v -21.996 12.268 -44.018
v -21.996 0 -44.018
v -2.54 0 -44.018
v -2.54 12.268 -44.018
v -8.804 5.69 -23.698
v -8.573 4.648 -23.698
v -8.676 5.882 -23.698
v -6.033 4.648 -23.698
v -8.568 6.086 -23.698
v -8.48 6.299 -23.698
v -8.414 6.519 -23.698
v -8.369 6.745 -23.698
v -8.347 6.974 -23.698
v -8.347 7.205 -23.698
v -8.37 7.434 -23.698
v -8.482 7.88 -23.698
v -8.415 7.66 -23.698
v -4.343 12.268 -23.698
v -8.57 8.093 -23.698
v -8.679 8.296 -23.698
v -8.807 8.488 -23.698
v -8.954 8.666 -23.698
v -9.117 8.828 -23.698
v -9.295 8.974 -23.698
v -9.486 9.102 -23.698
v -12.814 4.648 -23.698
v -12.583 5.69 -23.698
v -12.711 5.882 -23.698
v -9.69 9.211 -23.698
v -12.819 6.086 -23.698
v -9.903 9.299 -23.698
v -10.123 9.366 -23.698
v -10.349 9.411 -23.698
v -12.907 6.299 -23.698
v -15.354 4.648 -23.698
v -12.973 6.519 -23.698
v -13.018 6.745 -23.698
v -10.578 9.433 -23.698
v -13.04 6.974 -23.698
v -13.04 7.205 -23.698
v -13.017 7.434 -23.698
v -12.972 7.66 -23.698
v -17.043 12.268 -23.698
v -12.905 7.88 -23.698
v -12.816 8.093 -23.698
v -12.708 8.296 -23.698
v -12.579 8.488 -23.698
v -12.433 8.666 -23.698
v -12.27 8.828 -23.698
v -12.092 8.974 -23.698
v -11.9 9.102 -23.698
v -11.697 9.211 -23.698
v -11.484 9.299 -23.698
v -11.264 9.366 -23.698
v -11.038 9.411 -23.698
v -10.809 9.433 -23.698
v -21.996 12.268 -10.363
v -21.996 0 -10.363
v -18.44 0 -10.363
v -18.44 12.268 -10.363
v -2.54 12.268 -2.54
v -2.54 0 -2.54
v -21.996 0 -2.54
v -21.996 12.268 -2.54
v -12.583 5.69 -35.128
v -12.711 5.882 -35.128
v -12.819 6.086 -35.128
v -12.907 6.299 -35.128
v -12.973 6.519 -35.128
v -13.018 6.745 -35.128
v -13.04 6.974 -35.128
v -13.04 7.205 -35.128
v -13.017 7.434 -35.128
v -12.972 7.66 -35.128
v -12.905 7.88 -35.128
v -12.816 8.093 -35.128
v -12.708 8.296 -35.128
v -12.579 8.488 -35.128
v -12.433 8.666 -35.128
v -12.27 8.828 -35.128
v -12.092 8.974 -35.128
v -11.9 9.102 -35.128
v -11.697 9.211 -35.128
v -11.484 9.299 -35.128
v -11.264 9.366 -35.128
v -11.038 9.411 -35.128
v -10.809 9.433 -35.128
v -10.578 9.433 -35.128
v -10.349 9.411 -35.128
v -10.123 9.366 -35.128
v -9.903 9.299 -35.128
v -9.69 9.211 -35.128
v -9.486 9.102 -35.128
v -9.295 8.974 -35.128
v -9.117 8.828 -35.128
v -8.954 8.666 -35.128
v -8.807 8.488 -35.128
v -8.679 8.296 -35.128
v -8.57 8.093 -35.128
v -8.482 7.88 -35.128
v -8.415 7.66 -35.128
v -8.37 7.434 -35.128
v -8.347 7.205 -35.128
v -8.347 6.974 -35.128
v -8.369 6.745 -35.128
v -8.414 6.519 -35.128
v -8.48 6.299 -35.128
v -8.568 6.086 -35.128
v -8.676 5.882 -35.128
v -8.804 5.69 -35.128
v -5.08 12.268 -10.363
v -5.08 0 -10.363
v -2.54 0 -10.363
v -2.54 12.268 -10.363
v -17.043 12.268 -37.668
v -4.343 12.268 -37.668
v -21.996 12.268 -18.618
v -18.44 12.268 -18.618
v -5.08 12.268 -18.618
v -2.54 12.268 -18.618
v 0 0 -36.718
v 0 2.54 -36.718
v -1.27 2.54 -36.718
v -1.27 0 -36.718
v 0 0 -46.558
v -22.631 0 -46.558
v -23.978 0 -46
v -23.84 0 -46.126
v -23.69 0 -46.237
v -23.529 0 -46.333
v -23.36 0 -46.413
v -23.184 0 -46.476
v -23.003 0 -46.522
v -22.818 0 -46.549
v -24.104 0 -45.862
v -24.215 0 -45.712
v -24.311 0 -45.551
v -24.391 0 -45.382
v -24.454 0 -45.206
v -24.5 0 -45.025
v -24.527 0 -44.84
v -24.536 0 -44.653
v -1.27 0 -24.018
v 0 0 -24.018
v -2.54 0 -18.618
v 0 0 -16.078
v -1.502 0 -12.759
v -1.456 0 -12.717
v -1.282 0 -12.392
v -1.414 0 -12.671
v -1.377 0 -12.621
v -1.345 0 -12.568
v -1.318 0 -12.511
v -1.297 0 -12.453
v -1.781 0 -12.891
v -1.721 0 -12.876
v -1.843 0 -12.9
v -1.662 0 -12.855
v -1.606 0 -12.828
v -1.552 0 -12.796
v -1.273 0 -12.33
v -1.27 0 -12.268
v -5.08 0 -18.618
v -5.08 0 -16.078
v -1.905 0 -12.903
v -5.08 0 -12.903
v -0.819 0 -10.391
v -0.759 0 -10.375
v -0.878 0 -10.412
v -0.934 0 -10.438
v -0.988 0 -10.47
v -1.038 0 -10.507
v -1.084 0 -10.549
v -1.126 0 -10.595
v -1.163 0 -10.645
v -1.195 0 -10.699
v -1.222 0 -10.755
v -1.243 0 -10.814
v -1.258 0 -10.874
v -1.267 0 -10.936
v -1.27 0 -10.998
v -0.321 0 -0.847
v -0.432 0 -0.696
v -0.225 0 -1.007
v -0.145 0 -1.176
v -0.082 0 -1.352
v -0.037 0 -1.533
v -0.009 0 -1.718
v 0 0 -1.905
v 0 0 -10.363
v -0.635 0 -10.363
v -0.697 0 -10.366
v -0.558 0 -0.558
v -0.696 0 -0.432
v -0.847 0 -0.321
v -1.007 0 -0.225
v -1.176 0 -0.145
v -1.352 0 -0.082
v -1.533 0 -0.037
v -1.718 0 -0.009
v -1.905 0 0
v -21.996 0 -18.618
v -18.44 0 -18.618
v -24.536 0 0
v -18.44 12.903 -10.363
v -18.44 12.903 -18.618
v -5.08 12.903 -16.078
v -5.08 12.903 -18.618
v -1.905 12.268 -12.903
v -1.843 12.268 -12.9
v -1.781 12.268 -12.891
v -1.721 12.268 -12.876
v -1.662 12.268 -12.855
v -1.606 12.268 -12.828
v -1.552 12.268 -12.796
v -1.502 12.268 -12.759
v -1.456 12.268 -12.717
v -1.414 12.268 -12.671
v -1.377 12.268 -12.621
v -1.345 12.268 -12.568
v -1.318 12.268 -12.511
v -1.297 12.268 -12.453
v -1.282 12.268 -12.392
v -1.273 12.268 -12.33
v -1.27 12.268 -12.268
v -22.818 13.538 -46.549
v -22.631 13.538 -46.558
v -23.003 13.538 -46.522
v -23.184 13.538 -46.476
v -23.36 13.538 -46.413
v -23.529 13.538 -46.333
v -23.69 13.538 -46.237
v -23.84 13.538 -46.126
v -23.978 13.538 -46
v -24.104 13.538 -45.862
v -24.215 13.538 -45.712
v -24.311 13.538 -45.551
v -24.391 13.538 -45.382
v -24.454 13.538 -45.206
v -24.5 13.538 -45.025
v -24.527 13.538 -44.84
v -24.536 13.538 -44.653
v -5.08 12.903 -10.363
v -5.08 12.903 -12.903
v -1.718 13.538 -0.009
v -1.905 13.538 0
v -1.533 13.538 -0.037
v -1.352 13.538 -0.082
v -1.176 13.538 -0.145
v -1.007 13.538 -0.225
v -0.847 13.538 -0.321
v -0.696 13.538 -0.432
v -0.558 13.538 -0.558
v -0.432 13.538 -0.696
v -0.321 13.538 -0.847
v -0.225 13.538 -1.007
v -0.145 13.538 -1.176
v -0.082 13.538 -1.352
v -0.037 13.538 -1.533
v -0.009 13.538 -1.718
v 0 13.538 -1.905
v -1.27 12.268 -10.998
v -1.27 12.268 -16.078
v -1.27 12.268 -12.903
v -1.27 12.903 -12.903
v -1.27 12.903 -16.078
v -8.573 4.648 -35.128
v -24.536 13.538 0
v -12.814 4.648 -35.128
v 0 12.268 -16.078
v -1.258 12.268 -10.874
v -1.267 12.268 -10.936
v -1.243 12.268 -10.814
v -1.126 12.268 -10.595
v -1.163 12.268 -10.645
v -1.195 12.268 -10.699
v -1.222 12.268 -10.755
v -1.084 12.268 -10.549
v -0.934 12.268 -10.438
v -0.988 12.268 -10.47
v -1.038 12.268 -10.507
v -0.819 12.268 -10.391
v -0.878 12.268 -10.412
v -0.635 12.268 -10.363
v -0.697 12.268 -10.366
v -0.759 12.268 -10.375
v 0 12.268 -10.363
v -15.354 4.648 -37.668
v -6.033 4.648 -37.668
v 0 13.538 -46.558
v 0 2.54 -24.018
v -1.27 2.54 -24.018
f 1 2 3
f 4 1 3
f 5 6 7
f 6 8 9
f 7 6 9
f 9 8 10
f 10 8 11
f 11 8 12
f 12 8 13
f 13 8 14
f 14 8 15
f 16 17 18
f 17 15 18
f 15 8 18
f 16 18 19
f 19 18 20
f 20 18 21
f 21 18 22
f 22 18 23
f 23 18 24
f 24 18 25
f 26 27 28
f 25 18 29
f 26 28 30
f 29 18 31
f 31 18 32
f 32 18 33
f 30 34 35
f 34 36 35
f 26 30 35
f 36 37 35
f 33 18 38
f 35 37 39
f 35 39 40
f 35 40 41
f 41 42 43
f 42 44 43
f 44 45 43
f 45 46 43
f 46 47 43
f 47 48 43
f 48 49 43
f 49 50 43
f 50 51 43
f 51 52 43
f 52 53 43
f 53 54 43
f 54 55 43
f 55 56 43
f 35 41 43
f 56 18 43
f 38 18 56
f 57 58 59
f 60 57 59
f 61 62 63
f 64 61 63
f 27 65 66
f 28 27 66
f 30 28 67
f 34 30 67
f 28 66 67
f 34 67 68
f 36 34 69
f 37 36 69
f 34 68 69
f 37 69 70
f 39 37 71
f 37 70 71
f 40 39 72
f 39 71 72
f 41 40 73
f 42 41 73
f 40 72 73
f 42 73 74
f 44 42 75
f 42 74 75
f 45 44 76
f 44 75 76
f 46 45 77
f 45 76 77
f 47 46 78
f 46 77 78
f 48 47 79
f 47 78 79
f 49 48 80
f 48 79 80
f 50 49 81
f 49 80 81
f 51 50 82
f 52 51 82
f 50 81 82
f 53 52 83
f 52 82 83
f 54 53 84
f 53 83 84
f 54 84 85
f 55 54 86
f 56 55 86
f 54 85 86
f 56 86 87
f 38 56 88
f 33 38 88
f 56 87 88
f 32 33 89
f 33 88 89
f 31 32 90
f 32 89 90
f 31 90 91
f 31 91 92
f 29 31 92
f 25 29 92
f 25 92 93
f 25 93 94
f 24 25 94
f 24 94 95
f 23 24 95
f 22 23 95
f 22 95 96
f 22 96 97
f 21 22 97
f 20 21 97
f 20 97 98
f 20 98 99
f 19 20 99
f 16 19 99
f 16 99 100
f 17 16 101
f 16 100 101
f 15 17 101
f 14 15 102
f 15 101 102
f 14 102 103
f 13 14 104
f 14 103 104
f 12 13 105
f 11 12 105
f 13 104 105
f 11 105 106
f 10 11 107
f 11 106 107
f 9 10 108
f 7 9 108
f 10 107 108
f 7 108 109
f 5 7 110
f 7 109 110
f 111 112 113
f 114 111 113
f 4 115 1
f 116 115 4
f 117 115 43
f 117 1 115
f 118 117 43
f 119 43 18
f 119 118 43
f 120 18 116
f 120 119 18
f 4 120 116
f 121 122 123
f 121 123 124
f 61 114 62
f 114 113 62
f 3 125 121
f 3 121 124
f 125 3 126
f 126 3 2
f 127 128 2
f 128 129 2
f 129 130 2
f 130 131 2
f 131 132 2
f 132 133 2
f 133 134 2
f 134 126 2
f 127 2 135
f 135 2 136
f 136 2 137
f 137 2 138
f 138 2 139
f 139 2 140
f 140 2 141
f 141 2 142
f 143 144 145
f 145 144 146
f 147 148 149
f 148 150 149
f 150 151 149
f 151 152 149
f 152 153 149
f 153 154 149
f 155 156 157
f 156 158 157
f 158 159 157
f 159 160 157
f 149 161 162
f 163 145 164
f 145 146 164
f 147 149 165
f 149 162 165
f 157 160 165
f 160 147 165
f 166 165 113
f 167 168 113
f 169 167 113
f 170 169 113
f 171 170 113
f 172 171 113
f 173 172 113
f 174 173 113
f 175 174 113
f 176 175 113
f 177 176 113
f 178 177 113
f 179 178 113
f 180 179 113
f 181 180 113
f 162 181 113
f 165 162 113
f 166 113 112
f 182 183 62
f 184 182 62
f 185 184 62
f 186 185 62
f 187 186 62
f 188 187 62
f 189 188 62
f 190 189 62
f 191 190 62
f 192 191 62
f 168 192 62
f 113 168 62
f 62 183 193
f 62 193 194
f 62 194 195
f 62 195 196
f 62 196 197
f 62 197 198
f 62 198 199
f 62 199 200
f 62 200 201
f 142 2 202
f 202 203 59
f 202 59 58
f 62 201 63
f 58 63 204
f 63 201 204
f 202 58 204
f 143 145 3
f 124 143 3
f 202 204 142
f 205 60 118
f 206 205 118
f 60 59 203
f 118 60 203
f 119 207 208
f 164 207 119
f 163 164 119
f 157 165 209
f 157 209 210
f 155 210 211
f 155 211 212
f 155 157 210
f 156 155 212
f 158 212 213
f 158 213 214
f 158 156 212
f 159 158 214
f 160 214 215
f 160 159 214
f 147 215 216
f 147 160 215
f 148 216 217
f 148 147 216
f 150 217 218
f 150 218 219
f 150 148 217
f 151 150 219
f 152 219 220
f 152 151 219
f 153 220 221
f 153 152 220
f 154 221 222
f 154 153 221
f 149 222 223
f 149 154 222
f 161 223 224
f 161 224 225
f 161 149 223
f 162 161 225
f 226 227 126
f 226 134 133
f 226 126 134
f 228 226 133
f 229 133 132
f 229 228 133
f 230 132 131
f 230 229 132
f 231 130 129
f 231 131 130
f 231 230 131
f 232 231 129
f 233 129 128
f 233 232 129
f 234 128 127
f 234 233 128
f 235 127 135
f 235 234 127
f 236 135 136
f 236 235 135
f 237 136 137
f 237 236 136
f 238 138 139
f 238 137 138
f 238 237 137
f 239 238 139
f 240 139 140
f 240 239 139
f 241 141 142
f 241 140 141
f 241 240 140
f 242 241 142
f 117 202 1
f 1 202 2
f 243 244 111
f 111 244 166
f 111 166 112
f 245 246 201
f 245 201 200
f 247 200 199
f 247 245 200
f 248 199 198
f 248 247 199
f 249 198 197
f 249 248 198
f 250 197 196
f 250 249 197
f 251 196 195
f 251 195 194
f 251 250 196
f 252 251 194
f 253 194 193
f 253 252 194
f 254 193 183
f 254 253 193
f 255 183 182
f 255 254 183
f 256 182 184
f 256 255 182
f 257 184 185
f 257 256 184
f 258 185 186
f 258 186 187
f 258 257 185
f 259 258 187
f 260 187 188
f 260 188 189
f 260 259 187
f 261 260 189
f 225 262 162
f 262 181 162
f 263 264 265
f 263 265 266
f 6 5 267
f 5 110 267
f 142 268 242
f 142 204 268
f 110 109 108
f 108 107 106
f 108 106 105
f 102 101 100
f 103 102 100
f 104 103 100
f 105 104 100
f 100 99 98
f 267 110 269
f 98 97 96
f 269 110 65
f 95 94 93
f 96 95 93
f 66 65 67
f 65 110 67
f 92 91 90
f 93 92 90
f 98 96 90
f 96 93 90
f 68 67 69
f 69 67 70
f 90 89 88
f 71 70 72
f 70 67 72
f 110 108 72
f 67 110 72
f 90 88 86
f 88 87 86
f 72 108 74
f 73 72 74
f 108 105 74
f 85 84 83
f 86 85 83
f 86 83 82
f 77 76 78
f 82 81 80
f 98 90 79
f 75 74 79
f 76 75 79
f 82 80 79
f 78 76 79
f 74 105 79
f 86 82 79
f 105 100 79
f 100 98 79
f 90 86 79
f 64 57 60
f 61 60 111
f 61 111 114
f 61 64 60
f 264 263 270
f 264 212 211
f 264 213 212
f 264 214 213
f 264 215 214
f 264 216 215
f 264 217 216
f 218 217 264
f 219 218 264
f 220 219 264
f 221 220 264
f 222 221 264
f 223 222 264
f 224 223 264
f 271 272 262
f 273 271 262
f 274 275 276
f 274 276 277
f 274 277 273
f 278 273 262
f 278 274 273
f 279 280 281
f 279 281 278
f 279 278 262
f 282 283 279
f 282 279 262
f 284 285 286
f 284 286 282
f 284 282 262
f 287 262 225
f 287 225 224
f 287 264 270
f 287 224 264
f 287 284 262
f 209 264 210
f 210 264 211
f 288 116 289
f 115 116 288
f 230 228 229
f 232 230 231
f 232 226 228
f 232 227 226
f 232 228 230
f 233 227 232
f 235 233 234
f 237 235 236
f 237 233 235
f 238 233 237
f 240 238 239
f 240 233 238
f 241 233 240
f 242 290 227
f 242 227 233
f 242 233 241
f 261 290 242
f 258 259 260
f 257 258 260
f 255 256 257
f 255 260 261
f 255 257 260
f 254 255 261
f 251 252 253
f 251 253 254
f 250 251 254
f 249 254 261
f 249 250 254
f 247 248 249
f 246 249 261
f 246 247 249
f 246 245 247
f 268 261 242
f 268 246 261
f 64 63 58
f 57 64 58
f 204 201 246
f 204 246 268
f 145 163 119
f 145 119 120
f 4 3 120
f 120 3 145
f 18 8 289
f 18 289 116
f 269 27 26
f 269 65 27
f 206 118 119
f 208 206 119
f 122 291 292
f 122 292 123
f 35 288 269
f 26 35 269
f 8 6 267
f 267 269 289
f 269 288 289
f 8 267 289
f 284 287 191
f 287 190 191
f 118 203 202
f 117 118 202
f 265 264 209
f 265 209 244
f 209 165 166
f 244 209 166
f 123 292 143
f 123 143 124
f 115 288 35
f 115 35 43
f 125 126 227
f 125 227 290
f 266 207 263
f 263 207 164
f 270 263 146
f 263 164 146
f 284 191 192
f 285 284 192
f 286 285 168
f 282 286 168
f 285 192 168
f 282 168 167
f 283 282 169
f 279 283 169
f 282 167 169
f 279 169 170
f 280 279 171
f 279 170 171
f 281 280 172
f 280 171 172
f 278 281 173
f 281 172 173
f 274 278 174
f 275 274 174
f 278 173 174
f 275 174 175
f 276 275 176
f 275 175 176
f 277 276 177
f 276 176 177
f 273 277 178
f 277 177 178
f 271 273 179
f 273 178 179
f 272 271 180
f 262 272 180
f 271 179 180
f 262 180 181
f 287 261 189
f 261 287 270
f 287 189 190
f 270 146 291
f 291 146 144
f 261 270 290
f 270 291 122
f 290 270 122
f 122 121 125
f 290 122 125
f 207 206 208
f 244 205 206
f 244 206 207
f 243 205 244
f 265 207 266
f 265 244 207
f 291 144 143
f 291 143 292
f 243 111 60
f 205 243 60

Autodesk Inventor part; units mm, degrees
ref_plane "YZ Plane" through (0, 0, 0) normal (1, 0, 0) x (0, 1, 0)
ref_plane "XZ Plane" through (0, 0, 0) normal (0, 1, 0) x (-1, 0, 0)
ref_plane "XY Plane" through (0, 0, 0) normal (0, 0, 1) x (1, 0, 0)
sketch "Sketch1" plane through (0, 0, 0) normal (0, 1, 0) x (-1, 0, 0)
  line L0 (0, 0) -> (24.5364, 0)
  line L1 (24.5364, 0) -> (24.5364, -46.5582)
  line L2 (24.5364, -46.5582) -> (0, -46.5582)
  line L3 (0, -46.5582) -> (0, 0)
  dimension "d0" = 46.5582
  dimension "d1" = 24.5364
extrude "Extrusion1" add sketch "Sketch1" along normal blind 13.5382
sketch "Sketch2" plane through (0, 0, 0) normal (0, -1, 0) x (1, 0, 0)
  point P0 (0, 0)
fillet "Fillet1" radius 1.905 1 edges at (-24.5364, 6.7691, -46.5582)
fillet "Fillet2" radius 1.905 1 edges at (0, 6.7691, 0)
sketch "Sketch3" plane through (0, 0, 0) normal (0, -1, 0) x (1, 0, 0)
  line L0 (-1.905, 0) -> (-24.5364, 0) projected
  arc A0 (0, -1.905) -> (-1.905, 0) centre (-1.905, -1.905) ccw projected
  line L1 (0, -46.5582) -> (0, -1.905) projected
  line L2 (-22.6314, -46.5582) -> (0, -46.5582) projected
  arc A1 (-24.5364, -44.6532) -> (-22.6314, -46.5582) centre (-22.6314, -44.6532) ccw projected
  line L3 (-24.5364, 0) -> (-24.5364, -44.6532) projected
  line L4 (-2.54, -2.54) -> (-21.9964, -2.54)
  line L5 (-21.9964, -44.0182) -> (-2.54, -44.0182)
  line L6 (0, -12.9032) -> (-5.08, -12.9032)
  line L7 (-5.08, -16.0782) -> (0, -16.0782)
  line L8 (-2.54, -44.0182) -> (-2.54, -18.6182)
  line L9 (-2.54, -10.3632) -> (-2.54, -2.54)
  line L10 (-5.08, -12.9032) -> (-5.08, -10.3632)
  line L11 (-5.08, -10.3632) -> (-2.54, -10.3632)
  line L12 (-5.08, -16.0782) -> (-5.08, -18.6182)
  line L13 (-5.08, -18.6182) -> (-2.54, -18.6182)
  line L14 (-21.9964, -10.3632) -> (-18.4404, -10.3632)
  line L15 (-18.4404, -10.3632) -> (-18.4404, -18.6182)
  line L16 (-18.4404, -18.6182) -> (-21.9964, -18.6182)
  line L17 (-21.9964, -2.54) -> (-21.9964, -10.3632)
  line L18 (-21.9964, -18.6182) -> (-21.9964, -44.0182)
  line L19 (0, -14.4907) -> (-5.2569, -14.4907) construction
  line L20 (-5.08, -11.6332) -> (-18.4404, -11.6332)
  line L21 (-5.08, -17.3482) -> (-18.4404, -17.3482)
  point P0 (0, 0)
  dimension "d7" = 2.54
  dimension "d9" = 2.54
  dimension "d11" = 3.175
  dimension "d13" = 5.08
  dimension "d14" = 2.54
  dimension "d15" = 2.54
  dimension "d16" = 2.54
  dimension "d17" = 2.54
  dimension "d20" = 2.54
  dimension "d21" = 6.096
  dimension "d22" = 2.54
  dimension "d37" = 32.0675
extrude "Extrusion2" cut sketch "Sketch3" against normal blind 12.2682 contours L1 L7 L12 L21 L15 L20 L10 L6 | L20 L15 L14 L17 L4 L9 L11 L10 | L12 L13 L8 L5 L18 L16 L15 L21
sketch "Sketch4" plane through (0, 12.2682, 0) normal (0, -1, 0) x (1, 0, 0)
  line L0 (-4.3434, -23.6982) -> (-17.0434, -23.6982)
  line L1 (-17.0434, -23.6982) -> (-17.0434, -35.1282)
  line L2 (-17.0434, -35.1282) -> (-4.3434, -35.1282)
  line L3 (-4.3434, -35.1282) -> (-4.3434, -23.6982)
  line L4 (-2.54, -44.0182) -> (-21.9964, -44.0182) projected
  line L5 (-2.54, -18.6182) -> (-2.54, -44.0182) projected
  line L6 (-10.6934, -23.6982) -> (-10.6934, -35.1282) construction
  line L7 (-24.5364, 0) -> (-24.5364, -44.6532) construction
  line L8 (-22.6314, -46.5582) -> (0, -46.5582) construction
  point P0 (0, 0)
  dimension "d23" = 13.843
  dimension "d24" = 12.7
  dimension "d25" = 11.43
  dimension "d26" = 22.86
extrude "Extrusion3" add sketch "Sketch4" along normal up to surface (12.2682 mm away)
sketch "Sketch5" plane through (-4.3434, 12.2682, -35.1282) normal (0, 0, -1) x (-1, 0, 0)
  line L0 (0, 0) -> (0, -12.2682) projected
  line L1 (12.7, 0) -> (12.7, -12.2682) projected
  line L2 (12.7, -12.2682) -> (0, -12.2682) projected
  arc A0 (8.2396, -6.5778) -> (4.4604, -6.5778) centre (6.35, -5.1816) ccw
  line L3 (6.35, -12.2682) -> (6.35, 0) construction
  line L4 (17.653, 0) -> (-1.8034, 0) construction
  line L5 (8.2396, -6.5778) -> (8.4707, -7.62)
  line L6 (8.4707, -7.62) -> (11.0107, -7.62)
  line L7 (11.0107, -7.62) -> (12.7, 0)
  line L8 (4.4604, -6.5778) -> (4.2293, -7.62)
  line L9 (4.2293, -7.62) -> (1.6893, -7.62)
  line L10 (1.6893, -7.62) -> (0, 0)
  point P0 (-4.3434, -12.2682)
  dimension "d29" = 7.0866
  dimension "d30" = 4.699
  dimension "d32" = 7.62
  dimension "d33" = 2.54
  dimension "d36" = 25
extrude "Extrusion4" cut sketch "Sketch5" against normal up to surface (11.43 mm away)
sketch "Sketch6" plane through (0, 12.2682, 0) normal (0, -1, 0) x (1, 0, 0)
  line L0 (-5.08, -10.3632) -> (-5.08, -12.9032) projected
  line L1 (-5.08, -16.0782) -> (-5.08, -18.6182) projected
  line L2 (-18.4404, -18.6182) -> (-18.4404, -10.3632) projected
  line L3 (0, -12.9032) -> (0, -16.0782) projected
  line L4 (0, -16.0782) -> (-5.08, -16.0782) projected
  line L5 (-5.08, -12.9032) -> (0, -12.9032) projected
  line L6 (-5.08, -10.3632) -> (-18.4404, -10.3632)
  line L7 (-18.4404, -18.6182) -> (-5.08, -18.6182)
  line L8 (-1.27, -12.9032) -> (-1.27, -16.0782)
  point P0 (0, 0)
  dimension "d46" = 1.27
extrude "Extrusion5" cut sketch "Sketch6" against normal blind 0.635
sketch "Sketch7" plane through (0, 0, 0) normal (0, -1, 0) x (1, 0, 0)
  line L0 (0, -12.9032) -> (0, -1.905) projected
  line L1 (0, -1.905) -> (0, -46.5582) projected
  line L2 (0, -10.3632) -> (-0.635, -10.3632)
  line L3 (-1.27, -10.9982) -> (-1.27, -12.2682)
  arc A0 (-0.635, -10.3632) -> (-1.27, -10.9982) centre (-0.635, -10.9982) ccw
  line L4 (-1.905, -12.9032) -> (-5.08, -12.9032)
  line L5 (-5.08, -10.3632) -> (-5.08, -12.9032) projected
  arc A1 (-1.905, -12.9032) -> (-1.27, -12.2682) centre (-1.905, -12.2682) ccw
  line L6 (0, -10.3632) -> (0, -12.9032)
  line L7 (0, -12.9032) -> (-1.905, -12.9032)
  line L8 (-5.08, -12.9032) -> (0, -12.9032) projected
  point P0 (0, 0)
  point P1 (-1.27, -10.3632)
  point P2 (-1.27, -12.9032)
  dimension "d40" = 1.27
  dimension "d41" = 2.54
  dimension "d42" = 0.635
  dimension "d43" = 0.635
extrude "Extrusion7" add sketch "Sketch6" against normal blind 0.635 contours L5 L3 L4 L8
extrude "Extrusion8" cut sketch "Sketch7" against normal up to surface (12.2682 mm away)
sketch "Sketch8" plane through (0, 0, -46.5582) normal (1, 0, 0) x (0, 0, -1)
  line L0 (-36.195, 0) -> (-36.195, 12.2682) projected
  line L1 (-30.48, 12.2682) -> (-36.195, 12.2682) projected
  line L2 (-30.48, 12.2682) -> (-30.48, 0) projected
  line L3 (0, 0) -> (-30.48, 0) projected
  line L4 (0, 0) -> (0, 13.5382) projected
  line L5 (-44.6532, 13.5382) -> (0, 13.5382) projected
  line L6 (-44.6532, 0) -> (-44.6532, 13.5382) projected
  line L7 (-36.195, 0) -> (-44.6532, 0) projected
  line L8 (-22.5397, 0) -> (-22.5397, 2.54)
  line L9 (-22.5397, 2.54) -> (-9.8397, 2.54)
  line L10 (-9.8397, 2.54) -> (-9.8397, 0)
  point P0 (-46.5582, 0)
  dimension "d51" = 2.54
  dimension "d52" = 12.7
extrude "Extrusion9" cut sketch "Sketch8" against normal blind 1.27 contours L8 L9 L10 L3
sketch "Sketch9" plane through (-4.3434, 12.2682, -35.1282) normal (0, 0, -1) x (-1, 0, 0)
  line L0 (12.7, 0) -> (11.0107, -7.62) projected
  line L1 (11.0107, -7.62) -> (8.4707, -7.62) projected
  line L2 (8.4707, -7.62) -> (8.2396, -6.5778) projected
  arc A0 (8.2396, -6.5778) -> (4.4604, -6.5778) centre (6.35, -5.1816) ccw projected
  line L3 (4.4604, -6.5778) -> (4.2293, -7.62) projected
  line L4 (4.2293, -7.62) -> (1.6893, -7.62) projected
  line L5 (1.6893, -7.62) -> (0, 0) projected
  line L6 (12.7, 0) -> (0, 0) projected
  line L7 (1.6893, -7.62) -> (11.0107, -7.62)
  line L8 (4.2293, -7.62) -> (1.6893, -7.62) projected
  point P0 (-4.3434, -12.2682)
extrude "Extrusion10" add sketch "Sketch9" along normal blind 2.54
equation "\"d27\" = d2"
equation "\"d34\" = d2"
equation "\"d2\" = 13.5382"
properties part number "Negative CAp"
